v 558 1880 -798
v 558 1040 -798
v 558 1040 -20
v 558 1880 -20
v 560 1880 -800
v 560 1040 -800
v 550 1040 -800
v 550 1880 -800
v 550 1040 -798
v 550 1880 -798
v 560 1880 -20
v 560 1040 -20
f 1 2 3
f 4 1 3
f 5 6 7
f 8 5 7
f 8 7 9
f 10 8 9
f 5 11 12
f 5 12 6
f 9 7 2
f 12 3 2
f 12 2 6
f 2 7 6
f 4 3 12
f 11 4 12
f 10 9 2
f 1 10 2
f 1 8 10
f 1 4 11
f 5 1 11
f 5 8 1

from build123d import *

# Parameters (mm, degrees)
PACK_SARJOR_L_KILAVUZ_2_1_START = 1040
PACK_SARJOR_L_KILAVUZ_2_1_DEPTH = 840


with BuildPart() as part:
    # Sketch1 → PACK_sarjor_L_kilavuz_2_1 (new body)
    with BuildSketch(Plane(origin=(0, 0, 0), x_dir=(1, 0, 0), z_dir=(0, 1, 0)).offset(PACK_SARJOR_L_KILAVUZ_2_1_START)):
        Polygon((560, 800), (550, 800), (550, 798), (558, 798), (558, 20), (560, 20), align=None)
    extrude(amount=PACK_SARJOR_L_KILAVUZ_2_1_DEPTH)


solid = part.part
